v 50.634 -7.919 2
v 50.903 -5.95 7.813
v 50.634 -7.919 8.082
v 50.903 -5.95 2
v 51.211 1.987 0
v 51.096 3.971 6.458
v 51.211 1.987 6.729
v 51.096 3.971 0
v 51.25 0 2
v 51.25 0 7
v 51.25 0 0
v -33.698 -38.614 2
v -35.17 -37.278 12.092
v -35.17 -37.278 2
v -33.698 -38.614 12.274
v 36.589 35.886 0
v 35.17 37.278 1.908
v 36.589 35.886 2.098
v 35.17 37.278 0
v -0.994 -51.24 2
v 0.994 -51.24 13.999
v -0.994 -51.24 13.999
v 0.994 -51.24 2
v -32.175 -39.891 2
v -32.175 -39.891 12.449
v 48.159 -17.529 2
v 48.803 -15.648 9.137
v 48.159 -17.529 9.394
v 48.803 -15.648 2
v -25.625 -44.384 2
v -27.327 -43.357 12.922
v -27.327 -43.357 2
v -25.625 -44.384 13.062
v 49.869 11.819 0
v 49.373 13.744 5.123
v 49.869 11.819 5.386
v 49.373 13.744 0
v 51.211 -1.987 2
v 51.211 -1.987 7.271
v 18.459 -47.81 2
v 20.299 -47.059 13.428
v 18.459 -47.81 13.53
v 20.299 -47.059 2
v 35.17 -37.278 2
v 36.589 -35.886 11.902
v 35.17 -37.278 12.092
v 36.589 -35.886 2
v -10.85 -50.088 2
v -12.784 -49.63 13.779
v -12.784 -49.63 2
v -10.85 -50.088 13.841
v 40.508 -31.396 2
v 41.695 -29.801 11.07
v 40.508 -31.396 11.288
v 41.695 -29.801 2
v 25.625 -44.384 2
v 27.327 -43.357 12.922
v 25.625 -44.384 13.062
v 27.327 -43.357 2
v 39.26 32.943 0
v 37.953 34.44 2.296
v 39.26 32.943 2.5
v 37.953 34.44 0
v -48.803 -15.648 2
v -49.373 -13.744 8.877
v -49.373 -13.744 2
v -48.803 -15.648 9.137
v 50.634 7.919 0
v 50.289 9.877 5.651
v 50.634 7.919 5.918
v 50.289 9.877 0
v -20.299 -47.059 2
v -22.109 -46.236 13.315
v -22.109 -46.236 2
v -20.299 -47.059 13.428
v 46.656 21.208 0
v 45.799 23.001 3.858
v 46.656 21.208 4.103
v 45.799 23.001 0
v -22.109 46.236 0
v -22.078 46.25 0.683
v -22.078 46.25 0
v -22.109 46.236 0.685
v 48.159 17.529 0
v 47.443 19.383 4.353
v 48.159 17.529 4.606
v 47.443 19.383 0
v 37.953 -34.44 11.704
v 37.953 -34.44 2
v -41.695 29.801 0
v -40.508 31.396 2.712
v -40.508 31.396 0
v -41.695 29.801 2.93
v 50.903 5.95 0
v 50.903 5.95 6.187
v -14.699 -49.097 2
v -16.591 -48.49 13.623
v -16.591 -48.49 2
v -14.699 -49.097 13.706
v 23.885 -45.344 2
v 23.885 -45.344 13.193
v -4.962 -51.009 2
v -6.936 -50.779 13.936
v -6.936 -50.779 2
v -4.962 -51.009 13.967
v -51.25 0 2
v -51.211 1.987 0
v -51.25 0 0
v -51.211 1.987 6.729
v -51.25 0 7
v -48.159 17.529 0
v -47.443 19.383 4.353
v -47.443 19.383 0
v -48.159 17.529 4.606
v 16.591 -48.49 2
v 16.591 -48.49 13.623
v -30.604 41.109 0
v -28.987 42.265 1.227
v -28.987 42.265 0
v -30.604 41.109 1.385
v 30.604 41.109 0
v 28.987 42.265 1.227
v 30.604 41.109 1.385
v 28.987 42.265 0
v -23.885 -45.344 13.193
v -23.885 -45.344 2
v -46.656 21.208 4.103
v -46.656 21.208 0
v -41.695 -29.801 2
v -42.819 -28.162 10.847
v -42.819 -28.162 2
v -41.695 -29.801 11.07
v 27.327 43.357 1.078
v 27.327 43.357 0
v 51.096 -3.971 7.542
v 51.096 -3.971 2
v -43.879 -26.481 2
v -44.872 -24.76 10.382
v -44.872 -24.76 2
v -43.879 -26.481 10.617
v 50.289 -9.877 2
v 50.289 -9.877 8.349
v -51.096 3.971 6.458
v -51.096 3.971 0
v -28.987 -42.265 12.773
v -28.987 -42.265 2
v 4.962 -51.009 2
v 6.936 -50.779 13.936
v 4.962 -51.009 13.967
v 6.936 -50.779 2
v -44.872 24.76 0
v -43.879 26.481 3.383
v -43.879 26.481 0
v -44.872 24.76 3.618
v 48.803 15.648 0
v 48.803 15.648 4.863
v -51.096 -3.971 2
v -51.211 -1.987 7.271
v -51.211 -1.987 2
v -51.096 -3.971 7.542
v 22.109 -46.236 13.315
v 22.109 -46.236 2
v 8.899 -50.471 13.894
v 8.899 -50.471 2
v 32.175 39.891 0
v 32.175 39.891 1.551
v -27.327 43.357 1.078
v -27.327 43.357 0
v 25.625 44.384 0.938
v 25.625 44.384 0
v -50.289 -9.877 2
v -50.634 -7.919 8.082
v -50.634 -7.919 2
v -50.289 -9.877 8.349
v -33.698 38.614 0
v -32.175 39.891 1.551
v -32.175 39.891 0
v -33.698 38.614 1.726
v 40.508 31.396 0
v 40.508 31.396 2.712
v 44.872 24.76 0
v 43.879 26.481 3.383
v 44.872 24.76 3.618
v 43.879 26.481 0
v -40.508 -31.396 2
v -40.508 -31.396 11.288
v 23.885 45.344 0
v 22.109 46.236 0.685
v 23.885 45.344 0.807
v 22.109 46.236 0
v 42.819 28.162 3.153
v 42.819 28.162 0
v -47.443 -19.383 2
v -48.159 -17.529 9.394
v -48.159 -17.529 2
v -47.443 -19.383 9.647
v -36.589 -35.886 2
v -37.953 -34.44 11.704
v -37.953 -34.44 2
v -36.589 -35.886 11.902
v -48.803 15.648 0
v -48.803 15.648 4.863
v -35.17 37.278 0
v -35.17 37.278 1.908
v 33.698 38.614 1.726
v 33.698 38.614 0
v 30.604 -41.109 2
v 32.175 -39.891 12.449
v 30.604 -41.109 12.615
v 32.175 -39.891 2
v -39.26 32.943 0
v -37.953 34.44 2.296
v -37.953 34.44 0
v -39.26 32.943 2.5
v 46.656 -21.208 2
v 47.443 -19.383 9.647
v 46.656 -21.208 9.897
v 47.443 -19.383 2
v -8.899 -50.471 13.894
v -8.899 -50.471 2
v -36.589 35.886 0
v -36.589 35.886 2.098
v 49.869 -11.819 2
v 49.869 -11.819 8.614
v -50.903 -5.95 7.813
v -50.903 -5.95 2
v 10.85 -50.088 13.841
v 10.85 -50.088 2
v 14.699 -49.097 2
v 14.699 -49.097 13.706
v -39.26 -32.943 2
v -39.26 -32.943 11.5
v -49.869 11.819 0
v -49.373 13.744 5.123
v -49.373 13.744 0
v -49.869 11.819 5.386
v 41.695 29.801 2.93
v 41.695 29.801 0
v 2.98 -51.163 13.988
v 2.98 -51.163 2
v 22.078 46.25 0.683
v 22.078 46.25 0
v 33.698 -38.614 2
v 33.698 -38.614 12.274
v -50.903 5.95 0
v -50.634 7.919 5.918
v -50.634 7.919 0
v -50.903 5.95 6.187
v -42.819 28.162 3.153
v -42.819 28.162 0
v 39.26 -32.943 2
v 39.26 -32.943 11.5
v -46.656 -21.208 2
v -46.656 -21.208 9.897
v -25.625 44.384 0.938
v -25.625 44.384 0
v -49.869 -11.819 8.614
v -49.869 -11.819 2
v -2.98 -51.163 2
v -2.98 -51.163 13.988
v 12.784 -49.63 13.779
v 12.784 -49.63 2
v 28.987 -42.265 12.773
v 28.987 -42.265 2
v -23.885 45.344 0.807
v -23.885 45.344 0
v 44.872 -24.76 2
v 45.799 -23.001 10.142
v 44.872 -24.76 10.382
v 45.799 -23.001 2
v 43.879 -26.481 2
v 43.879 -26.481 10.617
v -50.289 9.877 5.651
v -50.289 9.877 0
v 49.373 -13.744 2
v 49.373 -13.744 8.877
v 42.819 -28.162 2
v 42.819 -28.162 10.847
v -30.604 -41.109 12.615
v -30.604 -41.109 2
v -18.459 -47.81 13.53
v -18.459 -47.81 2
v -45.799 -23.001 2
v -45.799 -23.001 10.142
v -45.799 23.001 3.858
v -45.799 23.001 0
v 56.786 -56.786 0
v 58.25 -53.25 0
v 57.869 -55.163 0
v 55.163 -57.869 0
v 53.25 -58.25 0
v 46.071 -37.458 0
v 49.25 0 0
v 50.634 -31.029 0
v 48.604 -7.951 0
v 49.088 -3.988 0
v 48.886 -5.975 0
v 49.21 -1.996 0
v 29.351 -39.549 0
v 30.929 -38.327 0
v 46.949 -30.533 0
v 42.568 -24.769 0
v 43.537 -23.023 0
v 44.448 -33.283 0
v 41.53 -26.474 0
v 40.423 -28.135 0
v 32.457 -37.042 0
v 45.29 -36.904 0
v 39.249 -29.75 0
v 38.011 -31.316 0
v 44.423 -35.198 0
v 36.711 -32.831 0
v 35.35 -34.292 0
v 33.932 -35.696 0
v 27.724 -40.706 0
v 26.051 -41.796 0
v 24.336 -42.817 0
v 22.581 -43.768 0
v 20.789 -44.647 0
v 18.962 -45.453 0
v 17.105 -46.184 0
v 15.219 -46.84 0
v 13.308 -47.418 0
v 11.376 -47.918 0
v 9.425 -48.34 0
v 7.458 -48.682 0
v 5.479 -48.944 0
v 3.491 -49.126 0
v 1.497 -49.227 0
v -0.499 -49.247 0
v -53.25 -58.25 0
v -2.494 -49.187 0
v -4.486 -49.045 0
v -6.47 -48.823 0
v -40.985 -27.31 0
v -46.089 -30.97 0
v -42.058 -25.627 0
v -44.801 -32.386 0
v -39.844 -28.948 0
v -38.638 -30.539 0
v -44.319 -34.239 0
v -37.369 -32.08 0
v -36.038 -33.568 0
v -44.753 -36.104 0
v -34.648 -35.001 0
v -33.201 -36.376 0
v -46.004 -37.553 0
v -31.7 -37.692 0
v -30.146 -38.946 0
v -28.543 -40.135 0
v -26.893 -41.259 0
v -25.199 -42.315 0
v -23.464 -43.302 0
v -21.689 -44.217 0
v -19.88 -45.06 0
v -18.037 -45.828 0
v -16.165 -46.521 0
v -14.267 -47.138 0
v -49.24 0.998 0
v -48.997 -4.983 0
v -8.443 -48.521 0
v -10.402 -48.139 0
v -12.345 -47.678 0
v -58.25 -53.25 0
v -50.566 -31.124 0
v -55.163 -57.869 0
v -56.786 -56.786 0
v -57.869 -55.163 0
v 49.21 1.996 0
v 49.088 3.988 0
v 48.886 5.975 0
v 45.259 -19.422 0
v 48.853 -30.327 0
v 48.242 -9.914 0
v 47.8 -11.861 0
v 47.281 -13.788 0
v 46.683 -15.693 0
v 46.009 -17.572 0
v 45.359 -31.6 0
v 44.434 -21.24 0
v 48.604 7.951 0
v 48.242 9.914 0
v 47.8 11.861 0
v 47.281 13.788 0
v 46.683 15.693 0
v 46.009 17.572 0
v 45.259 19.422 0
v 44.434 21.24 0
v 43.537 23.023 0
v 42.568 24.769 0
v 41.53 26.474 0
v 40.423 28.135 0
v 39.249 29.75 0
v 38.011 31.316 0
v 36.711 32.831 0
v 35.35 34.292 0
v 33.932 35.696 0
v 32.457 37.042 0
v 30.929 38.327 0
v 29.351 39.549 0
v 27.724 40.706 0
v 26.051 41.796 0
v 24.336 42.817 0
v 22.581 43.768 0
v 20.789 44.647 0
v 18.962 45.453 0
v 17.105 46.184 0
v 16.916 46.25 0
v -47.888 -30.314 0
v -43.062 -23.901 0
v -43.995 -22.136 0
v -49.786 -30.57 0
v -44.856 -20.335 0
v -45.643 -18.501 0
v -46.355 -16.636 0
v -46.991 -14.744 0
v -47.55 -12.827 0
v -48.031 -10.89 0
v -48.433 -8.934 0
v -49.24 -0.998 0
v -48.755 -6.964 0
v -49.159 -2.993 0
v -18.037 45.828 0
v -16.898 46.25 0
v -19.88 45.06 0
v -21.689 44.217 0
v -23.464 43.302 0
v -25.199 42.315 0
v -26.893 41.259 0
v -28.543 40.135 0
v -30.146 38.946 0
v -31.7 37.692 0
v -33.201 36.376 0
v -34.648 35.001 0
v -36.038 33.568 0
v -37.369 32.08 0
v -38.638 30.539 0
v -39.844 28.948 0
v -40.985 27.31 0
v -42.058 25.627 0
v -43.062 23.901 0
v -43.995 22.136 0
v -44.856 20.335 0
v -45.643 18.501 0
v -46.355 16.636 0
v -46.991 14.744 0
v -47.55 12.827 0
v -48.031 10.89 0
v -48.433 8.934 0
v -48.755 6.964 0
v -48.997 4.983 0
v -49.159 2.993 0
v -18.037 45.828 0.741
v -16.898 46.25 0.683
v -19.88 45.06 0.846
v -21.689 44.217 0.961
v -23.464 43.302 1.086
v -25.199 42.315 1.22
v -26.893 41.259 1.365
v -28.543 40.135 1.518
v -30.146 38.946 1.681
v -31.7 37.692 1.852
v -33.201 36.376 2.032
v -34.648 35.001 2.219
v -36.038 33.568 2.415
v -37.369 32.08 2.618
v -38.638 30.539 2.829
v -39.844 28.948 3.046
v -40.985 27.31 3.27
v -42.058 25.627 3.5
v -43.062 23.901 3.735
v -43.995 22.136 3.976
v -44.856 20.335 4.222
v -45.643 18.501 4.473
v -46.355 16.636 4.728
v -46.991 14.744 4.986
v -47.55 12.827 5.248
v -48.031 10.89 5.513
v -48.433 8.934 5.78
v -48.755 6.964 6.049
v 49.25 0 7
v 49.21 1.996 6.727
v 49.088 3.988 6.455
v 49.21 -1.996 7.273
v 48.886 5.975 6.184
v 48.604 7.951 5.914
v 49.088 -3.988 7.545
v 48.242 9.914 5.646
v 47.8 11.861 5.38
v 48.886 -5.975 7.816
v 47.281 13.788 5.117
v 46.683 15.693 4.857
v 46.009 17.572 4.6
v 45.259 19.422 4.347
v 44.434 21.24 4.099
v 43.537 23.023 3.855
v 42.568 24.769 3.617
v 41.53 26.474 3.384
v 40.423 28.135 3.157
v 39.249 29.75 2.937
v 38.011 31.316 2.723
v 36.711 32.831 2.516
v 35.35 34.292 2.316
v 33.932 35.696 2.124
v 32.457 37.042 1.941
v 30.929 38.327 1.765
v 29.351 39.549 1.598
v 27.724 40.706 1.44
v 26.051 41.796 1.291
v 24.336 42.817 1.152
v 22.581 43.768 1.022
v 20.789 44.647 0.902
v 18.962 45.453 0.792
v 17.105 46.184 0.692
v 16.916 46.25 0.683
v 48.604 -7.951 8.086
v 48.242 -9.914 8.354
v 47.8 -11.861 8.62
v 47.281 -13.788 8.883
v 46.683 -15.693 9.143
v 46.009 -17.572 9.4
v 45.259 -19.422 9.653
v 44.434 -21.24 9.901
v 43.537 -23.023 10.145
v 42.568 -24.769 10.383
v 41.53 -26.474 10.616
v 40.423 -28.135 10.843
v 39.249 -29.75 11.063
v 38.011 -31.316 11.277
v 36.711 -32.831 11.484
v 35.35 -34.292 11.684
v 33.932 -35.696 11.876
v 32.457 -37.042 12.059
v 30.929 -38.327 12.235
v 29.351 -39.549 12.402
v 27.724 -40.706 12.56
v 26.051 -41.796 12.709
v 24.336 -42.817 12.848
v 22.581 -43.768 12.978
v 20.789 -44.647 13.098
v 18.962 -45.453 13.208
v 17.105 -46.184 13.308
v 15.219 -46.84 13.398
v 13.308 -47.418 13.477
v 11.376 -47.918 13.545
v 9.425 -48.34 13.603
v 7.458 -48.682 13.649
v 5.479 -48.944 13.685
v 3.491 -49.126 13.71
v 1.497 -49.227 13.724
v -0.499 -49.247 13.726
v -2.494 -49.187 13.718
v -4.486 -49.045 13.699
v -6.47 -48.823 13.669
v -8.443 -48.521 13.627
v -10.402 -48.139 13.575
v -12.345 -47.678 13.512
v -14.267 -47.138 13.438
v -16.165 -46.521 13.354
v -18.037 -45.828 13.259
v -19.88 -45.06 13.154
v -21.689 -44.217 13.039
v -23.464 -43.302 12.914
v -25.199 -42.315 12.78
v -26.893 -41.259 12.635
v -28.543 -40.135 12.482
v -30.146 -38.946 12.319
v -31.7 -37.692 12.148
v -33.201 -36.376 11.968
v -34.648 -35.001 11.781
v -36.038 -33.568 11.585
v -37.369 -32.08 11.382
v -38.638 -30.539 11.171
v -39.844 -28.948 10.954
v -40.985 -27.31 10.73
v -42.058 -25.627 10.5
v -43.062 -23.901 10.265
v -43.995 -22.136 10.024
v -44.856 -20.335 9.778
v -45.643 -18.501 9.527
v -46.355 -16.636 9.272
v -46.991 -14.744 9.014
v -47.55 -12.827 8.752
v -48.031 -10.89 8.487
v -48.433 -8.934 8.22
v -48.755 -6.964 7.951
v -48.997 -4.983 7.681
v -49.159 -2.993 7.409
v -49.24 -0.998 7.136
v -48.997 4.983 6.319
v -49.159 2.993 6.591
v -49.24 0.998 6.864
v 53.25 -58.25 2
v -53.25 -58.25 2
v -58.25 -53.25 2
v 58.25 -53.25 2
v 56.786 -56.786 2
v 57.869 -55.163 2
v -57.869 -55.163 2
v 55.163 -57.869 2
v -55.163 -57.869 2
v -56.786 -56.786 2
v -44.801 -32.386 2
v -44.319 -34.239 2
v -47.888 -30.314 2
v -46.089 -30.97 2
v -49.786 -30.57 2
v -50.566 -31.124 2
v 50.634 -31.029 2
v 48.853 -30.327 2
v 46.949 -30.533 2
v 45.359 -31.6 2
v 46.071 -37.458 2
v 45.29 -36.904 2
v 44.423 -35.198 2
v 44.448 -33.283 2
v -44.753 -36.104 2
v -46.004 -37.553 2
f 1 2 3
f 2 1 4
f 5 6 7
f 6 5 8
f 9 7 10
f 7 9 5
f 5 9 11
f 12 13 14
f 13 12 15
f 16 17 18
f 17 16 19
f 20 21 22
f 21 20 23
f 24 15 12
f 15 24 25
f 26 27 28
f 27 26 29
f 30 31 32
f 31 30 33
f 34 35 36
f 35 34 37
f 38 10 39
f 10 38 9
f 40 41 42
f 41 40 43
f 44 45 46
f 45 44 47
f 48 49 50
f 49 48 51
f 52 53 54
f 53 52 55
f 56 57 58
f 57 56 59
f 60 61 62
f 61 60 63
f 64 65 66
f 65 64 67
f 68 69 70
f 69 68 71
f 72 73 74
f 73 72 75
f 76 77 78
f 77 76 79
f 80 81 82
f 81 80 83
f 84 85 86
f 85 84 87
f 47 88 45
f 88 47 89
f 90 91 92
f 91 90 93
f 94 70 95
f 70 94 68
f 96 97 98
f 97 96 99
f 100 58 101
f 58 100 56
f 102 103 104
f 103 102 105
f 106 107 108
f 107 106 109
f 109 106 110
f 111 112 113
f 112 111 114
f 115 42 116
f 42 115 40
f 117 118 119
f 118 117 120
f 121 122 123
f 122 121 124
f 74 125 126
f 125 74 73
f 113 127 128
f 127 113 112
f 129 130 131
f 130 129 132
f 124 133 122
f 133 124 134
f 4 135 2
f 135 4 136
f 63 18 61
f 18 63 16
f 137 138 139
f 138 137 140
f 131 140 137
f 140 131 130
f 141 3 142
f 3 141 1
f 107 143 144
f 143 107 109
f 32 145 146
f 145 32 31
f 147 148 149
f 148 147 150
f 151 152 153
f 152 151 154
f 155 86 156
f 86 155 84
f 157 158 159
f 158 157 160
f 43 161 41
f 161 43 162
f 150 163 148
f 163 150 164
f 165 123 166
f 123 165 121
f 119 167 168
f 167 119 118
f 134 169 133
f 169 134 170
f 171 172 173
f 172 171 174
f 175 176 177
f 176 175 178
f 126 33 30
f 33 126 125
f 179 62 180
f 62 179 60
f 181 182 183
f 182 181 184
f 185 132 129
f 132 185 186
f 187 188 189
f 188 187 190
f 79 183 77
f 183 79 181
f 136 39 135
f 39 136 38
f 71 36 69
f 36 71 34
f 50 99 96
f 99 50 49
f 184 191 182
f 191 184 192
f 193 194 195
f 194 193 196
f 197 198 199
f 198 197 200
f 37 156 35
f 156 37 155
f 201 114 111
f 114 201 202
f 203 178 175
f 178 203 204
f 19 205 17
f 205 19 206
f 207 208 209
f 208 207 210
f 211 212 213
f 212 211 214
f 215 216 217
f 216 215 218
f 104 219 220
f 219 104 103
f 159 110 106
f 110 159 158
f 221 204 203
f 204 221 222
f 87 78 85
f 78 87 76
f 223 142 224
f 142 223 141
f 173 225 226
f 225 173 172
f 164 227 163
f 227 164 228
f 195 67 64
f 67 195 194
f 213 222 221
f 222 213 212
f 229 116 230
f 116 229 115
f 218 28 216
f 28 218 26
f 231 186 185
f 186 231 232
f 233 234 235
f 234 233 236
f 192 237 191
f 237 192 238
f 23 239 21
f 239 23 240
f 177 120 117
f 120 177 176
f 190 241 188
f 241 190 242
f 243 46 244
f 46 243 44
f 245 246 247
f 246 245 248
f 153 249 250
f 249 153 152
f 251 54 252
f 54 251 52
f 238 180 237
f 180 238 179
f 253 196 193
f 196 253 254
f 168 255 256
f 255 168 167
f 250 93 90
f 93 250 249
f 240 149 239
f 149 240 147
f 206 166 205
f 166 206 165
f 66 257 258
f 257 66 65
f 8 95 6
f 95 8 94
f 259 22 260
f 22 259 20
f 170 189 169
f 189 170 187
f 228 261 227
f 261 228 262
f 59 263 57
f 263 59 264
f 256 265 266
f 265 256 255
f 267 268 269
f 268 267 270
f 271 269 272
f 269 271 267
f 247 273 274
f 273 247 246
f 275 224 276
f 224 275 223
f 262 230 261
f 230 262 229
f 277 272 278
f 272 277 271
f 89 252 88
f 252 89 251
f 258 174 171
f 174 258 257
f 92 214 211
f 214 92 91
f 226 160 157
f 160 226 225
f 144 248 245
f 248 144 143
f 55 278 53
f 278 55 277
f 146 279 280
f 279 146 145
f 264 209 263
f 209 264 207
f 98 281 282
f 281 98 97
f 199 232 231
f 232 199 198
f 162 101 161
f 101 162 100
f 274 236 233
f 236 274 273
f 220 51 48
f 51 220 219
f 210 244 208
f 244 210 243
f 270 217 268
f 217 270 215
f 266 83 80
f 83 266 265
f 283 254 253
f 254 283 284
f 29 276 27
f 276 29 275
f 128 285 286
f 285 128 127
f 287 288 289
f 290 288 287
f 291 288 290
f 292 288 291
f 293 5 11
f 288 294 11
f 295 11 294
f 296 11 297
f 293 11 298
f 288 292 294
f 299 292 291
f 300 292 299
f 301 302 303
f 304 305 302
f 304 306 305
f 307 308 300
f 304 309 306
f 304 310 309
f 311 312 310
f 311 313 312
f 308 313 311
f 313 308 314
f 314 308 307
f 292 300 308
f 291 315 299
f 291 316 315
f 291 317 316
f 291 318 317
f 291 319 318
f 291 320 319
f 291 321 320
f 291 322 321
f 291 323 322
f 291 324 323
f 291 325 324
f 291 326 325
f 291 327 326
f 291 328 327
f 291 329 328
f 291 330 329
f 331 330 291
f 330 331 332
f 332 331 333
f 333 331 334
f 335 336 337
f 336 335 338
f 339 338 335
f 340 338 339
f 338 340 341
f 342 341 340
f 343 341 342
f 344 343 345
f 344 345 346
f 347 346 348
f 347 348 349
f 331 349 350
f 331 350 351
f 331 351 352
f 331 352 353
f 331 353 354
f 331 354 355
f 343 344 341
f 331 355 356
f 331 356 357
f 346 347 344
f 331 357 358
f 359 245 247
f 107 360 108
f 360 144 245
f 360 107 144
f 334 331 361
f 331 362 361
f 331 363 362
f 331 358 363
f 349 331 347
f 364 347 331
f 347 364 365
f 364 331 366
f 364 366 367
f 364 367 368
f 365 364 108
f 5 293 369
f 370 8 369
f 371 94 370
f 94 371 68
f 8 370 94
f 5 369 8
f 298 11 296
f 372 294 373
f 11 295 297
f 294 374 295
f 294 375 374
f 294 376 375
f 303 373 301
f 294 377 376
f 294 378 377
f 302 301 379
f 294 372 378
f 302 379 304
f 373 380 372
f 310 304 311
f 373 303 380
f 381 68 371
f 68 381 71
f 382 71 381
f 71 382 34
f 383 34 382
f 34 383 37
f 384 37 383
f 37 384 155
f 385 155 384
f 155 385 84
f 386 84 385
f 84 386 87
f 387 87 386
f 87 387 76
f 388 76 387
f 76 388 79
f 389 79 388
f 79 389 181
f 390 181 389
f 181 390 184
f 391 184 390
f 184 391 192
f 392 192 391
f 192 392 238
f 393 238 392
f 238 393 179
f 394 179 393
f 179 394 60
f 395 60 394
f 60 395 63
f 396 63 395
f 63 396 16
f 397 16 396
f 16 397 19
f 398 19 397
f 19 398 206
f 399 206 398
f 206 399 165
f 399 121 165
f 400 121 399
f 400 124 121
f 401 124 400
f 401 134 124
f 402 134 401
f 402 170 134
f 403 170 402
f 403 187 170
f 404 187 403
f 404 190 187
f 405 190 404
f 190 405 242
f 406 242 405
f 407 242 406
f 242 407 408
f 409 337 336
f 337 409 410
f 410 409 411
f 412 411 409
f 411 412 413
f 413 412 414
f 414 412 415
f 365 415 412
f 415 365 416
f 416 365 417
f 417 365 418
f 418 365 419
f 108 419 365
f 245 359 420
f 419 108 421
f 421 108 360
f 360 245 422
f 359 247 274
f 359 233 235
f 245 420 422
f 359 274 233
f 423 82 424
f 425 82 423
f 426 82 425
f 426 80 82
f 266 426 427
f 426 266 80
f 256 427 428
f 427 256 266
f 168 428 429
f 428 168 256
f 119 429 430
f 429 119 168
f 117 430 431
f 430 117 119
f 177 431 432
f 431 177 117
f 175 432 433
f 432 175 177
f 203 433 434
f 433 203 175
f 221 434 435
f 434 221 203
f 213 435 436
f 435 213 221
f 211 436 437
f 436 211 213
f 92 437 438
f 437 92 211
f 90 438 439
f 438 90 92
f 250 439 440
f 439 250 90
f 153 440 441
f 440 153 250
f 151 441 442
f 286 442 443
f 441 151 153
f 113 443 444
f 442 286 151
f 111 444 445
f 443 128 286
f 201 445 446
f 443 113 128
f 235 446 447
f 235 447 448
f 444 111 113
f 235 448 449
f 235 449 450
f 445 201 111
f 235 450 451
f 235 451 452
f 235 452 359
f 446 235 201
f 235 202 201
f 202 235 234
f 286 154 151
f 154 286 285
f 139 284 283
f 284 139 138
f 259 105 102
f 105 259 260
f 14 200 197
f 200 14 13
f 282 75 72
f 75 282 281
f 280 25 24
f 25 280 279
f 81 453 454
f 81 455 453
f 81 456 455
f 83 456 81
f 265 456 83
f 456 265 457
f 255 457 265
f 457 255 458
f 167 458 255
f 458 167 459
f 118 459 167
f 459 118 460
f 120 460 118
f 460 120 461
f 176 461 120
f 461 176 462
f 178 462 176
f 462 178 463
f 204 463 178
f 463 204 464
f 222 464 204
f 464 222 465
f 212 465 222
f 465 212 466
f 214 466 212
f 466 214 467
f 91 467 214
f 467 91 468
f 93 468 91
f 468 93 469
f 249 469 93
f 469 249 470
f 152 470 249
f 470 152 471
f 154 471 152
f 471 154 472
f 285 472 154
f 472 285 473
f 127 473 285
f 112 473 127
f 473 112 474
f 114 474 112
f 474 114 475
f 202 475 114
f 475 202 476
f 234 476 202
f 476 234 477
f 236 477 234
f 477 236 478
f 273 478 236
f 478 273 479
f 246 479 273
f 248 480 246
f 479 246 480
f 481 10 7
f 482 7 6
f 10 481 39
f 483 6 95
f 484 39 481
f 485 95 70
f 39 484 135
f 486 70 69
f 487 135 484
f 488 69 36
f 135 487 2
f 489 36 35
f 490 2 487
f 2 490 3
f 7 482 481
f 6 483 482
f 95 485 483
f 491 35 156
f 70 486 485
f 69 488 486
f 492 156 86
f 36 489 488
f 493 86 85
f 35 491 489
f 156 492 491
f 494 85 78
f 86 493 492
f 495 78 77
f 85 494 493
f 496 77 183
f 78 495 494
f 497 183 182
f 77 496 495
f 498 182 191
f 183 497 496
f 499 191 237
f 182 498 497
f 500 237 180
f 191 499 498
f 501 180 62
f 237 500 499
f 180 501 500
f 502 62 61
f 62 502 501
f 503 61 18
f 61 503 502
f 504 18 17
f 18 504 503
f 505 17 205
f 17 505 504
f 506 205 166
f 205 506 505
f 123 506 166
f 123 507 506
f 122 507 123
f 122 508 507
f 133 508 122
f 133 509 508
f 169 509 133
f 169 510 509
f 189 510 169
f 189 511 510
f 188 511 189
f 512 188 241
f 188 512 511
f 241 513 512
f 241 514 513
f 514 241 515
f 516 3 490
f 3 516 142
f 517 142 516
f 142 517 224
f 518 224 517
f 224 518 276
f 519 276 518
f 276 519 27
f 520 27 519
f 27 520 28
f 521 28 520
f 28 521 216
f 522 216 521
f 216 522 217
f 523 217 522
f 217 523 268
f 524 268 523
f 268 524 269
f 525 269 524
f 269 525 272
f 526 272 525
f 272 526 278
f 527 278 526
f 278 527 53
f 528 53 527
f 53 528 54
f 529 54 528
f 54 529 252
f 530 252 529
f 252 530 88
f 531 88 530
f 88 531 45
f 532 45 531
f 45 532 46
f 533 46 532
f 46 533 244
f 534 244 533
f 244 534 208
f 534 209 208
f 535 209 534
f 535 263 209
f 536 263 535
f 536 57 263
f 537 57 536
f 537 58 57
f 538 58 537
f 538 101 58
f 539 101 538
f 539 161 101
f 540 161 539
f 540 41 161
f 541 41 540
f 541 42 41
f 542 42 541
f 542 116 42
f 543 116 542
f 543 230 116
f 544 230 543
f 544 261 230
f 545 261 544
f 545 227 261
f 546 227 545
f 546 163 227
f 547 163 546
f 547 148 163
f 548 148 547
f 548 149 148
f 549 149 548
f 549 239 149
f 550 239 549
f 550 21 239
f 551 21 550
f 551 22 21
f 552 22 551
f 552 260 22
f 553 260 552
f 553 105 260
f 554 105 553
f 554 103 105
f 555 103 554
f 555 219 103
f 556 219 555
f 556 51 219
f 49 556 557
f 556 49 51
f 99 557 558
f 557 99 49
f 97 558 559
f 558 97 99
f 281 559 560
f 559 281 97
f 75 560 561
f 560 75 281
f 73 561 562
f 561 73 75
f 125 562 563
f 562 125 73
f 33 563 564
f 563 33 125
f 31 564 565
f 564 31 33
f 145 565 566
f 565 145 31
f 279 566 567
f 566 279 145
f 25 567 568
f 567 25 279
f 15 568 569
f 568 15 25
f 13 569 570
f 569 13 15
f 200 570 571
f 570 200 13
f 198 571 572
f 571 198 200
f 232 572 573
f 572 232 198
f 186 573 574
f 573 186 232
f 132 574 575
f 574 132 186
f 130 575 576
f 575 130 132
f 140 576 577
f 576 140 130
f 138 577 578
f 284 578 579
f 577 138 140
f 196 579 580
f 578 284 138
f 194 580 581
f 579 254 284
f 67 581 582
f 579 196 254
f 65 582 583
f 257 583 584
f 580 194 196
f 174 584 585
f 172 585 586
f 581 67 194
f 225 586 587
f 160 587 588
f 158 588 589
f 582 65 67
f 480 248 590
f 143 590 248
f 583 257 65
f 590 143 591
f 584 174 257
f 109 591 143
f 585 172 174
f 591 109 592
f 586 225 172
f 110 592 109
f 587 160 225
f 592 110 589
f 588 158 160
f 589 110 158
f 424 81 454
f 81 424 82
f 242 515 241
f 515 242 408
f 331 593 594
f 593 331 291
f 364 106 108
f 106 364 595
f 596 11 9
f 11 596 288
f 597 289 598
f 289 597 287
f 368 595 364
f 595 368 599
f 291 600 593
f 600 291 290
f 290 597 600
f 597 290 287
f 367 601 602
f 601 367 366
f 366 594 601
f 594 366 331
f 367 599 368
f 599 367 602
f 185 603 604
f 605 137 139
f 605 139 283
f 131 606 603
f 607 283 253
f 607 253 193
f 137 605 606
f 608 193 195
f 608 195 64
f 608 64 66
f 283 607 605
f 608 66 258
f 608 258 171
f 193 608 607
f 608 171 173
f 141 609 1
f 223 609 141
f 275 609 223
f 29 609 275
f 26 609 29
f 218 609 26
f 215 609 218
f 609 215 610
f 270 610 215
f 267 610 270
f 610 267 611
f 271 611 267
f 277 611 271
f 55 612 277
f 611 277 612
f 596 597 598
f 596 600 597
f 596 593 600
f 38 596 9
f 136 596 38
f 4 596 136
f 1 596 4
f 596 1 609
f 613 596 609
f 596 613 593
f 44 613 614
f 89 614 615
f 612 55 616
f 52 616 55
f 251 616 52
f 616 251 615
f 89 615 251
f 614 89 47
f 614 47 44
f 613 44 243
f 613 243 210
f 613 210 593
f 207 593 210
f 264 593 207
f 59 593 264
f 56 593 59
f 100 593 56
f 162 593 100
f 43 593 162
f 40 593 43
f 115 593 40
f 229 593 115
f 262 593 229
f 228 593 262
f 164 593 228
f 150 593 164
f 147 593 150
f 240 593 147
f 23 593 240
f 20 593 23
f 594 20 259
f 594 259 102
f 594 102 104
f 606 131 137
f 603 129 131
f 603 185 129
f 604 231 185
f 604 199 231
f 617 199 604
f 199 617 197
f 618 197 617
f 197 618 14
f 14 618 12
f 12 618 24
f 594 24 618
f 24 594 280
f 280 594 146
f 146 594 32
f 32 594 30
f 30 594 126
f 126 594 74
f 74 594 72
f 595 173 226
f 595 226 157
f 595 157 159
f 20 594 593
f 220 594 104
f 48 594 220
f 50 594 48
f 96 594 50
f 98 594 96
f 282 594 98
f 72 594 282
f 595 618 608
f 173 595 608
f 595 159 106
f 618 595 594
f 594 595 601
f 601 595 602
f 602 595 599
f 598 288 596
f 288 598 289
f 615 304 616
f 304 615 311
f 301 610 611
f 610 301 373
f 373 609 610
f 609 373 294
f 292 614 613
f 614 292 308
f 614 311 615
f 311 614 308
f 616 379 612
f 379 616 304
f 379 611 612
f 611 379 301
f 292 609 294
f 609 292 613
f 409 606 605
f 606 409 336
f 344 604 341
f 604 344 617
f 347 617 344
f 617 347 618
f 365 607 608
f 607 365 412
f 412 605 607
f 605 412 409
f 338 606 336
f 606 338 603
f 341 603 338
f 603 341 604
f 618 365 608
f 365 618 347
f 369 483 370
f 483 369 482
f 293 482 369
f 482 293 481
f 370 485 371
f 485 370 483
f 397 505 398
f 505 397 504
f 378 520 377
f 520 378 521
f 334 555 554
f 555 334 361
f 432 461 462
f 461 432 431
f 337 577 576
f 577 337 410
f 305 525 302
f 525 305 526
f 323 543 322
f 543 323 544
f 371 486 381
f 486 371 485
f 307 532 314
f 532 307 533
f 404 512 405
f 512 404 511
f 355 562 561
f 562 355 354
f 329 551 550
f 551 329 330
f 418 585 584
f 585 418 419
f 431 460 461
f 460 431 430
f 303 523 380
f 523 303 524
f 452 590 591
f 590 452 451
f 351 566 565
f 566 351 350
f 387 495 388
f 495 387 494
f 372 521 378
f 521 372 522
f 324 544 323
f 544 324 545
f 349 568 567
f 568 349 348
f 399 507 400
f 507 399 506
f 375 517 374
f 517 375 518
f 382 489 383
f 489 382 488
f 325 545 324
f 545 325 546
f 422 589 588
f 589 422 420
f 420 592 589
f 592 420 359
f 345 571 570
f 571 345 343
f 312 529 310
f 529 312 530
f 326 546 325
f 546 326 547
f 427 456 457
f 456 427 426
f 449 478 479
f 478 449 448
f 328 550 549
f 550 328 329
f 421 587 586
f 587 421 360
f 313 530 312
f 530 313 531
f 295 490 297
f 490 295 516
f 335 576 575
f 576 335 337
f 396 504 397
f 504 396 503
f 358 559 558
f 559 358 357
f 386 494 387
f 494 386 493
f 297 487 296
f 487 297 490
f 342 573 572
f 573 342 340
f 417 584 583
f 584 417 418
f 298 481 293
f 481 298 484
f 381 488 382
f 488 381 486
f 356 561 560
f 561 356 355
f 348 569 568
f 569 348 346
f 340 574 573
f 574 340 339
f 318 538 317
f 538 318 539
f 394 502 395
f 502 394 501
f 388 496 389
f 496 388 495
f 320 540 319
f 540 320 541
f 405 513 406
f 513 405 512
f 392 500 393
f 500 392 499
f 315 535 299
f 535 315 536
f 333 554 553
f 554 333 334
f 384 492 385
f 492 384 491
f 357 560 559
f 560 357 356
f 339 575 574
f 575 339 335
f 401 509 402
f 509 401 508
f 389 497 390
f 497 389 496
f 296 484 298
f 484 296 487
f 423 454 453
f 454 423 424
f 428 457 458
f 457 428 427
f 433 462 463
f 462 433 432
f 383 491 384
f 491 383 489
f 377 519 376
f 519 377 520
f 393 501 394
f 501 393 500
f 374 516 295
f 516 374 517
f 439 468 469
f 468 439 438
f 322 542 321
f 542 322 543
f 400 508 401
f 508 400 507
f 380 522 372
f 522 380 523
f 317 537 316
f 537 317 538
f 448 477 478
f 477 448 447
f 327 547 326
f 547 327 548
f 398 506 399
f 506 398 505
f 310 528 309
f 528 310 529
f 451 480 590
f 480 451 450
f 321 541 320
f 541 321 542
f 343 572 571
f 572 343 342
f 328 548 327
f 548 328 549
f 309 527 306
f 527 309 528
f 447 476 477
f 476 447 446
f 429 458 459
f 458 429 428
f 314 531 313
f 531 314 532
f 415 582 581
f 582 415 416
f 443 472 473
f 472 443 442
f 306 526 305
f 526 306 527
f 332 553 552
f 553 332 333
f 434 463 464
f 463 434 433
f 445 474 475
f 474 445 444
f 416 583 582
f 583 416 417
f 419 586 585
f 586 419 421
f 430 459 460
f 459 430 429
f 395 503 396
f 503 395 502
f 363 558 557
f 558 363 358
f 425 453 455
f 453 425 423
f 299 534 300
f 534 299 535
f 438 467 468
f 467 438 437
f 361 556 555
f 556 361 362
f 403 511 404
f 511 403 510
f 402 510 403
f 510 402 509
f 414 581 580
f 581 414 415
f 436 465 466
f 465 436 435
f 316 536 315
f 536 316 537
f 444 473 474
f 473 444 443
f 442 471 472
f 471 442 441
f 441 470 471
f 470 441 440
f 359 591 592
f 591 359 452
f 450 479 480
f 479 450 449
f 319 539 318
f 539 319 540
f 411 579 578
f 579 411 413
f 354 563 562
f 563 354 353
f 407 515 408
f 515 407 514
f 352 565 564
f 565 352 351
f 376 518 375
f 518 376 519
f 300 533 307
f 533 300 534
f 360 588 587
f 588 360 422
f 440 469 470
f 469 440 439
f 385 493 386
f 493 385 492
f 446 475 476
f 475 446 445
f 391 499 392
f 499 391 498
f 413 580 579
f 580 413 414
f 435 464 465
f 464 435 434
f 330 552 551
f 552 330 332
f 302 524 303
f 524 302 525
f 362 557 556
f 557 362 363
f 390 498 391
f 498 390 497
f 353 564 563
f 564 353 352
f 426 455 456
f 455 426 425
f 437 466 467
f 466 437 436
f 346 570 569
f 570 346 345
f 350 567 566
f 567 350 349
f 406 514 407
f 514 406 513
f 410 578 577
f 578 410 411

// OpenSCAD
// Inside diameter of the pipe
inner_diameter = 98.5;
// Wall thickness for this flange
thickness = 2;
// Distance from pipe to flap
height = 14;
// Diameter of hole for mounting screw
screw_diameter = 8;
// Distance between screw hole centers
screw_distance = 96.6372;
// Shortest distance between screw hole and inside pipe edge
screw_offset = 6;
// Radius for the bottom corners
bottom_corner_radius = 5;
// Amount to snip off the top (in case of a tight fit)
top_snip = 5;

// Internal variables
$fa = 0.25*1; // Smooth arcs
inner_radius = inner_diameter/2;
outer_radius = inner_radius + thickness;
outer_diameter = outer_radius*2;
screw_radius = screw_diameter/2;
screw_hole_r = inner_radius+screw_offset+screw_radius;
screw_hole_theta = asin(screw_distance/(2*screw_hole_r));
screw_hole_x = screw_distance/2;
screw_hole_y = screw_hole_r*cos(screw_hole_theta);
bottom_edge_y = max(outer_radius,screw_hole_y)+thickness;
bottom_edge_x = max(outer_radius,screw_hole_x)+thickness;

difference() {
    // Build the flange as a solid first
    union() {
        // Wedge-shaped cylinder
        intersection() {
            // Outer-diameter cylinder
            cylinder(r=outer_radius, h=height);
            // Wedge shape
            translate([-outer_radius,0,0])
                rotate([0,90,0])
                linear_extrude(
                    height=outer_diameter
                )
                polygon(points = [
                    [ -0, -outer_radius],
                    [  0,  outer_radius],
                    [-14, -outer_radius]
                ]);
            // Top snip
            translate([0,-top_snip,height/2-1])
            cube([outer_diameter,outer_diameter,height+2], center=true);
        };
        // bottom piece of flange
        hull() {
            linear_extrude(height = thickness)
                polygon(points = [
                    [-outer_radius, 0],
                    [ outer_radius, 0],
                    [ bottom_edge_x, -bottom_edge_y],
                    [-bottom_edge_x, -bottom_edge_y]
                ]);
            translate([ bottom_edge_x, -bottom_edge_y, 0])
                cylinder(r=bottom_corner_radius, h=thickness);
            translate([-bottom_edge_x, -bottom_edge_y, 0])
                cylinder(r=bottom_corner_radius, h=thickness);
        }
    };
    
    // Bore out the inner diameter and screw holes now
    translate([0,0,-1]) {
        union() {
            // Center of pipe
            cylinder(r=inner_radius, h=height+2);
            // Right side screw hole (half-circle)
            translate([screw_hole_x,-screw_hole_y,0])
                rotate([0,0,screw_hole_theta]) difference() {
                    cylinder(r=screw_radius, h=height+2);
                    translate([0,-screw_radius,-1])
                    cube(size=[screw_radius*2,screw_radius*2,height+4], center=true);
                };
            // Left side screw hole (half-circle)
            translate([-screw_hole_x,-screw_hole_y,0])
                rotate([0,0,-screw_hole_theta]) difference() {
                    cylinder(r=screw_radius, h=height+2);
                    translate([0,-screw_radius,-1])
                    cube(size=[screw_radius*2,screw_radius*2,height+4], center=true);
                };
        }
    }
}
